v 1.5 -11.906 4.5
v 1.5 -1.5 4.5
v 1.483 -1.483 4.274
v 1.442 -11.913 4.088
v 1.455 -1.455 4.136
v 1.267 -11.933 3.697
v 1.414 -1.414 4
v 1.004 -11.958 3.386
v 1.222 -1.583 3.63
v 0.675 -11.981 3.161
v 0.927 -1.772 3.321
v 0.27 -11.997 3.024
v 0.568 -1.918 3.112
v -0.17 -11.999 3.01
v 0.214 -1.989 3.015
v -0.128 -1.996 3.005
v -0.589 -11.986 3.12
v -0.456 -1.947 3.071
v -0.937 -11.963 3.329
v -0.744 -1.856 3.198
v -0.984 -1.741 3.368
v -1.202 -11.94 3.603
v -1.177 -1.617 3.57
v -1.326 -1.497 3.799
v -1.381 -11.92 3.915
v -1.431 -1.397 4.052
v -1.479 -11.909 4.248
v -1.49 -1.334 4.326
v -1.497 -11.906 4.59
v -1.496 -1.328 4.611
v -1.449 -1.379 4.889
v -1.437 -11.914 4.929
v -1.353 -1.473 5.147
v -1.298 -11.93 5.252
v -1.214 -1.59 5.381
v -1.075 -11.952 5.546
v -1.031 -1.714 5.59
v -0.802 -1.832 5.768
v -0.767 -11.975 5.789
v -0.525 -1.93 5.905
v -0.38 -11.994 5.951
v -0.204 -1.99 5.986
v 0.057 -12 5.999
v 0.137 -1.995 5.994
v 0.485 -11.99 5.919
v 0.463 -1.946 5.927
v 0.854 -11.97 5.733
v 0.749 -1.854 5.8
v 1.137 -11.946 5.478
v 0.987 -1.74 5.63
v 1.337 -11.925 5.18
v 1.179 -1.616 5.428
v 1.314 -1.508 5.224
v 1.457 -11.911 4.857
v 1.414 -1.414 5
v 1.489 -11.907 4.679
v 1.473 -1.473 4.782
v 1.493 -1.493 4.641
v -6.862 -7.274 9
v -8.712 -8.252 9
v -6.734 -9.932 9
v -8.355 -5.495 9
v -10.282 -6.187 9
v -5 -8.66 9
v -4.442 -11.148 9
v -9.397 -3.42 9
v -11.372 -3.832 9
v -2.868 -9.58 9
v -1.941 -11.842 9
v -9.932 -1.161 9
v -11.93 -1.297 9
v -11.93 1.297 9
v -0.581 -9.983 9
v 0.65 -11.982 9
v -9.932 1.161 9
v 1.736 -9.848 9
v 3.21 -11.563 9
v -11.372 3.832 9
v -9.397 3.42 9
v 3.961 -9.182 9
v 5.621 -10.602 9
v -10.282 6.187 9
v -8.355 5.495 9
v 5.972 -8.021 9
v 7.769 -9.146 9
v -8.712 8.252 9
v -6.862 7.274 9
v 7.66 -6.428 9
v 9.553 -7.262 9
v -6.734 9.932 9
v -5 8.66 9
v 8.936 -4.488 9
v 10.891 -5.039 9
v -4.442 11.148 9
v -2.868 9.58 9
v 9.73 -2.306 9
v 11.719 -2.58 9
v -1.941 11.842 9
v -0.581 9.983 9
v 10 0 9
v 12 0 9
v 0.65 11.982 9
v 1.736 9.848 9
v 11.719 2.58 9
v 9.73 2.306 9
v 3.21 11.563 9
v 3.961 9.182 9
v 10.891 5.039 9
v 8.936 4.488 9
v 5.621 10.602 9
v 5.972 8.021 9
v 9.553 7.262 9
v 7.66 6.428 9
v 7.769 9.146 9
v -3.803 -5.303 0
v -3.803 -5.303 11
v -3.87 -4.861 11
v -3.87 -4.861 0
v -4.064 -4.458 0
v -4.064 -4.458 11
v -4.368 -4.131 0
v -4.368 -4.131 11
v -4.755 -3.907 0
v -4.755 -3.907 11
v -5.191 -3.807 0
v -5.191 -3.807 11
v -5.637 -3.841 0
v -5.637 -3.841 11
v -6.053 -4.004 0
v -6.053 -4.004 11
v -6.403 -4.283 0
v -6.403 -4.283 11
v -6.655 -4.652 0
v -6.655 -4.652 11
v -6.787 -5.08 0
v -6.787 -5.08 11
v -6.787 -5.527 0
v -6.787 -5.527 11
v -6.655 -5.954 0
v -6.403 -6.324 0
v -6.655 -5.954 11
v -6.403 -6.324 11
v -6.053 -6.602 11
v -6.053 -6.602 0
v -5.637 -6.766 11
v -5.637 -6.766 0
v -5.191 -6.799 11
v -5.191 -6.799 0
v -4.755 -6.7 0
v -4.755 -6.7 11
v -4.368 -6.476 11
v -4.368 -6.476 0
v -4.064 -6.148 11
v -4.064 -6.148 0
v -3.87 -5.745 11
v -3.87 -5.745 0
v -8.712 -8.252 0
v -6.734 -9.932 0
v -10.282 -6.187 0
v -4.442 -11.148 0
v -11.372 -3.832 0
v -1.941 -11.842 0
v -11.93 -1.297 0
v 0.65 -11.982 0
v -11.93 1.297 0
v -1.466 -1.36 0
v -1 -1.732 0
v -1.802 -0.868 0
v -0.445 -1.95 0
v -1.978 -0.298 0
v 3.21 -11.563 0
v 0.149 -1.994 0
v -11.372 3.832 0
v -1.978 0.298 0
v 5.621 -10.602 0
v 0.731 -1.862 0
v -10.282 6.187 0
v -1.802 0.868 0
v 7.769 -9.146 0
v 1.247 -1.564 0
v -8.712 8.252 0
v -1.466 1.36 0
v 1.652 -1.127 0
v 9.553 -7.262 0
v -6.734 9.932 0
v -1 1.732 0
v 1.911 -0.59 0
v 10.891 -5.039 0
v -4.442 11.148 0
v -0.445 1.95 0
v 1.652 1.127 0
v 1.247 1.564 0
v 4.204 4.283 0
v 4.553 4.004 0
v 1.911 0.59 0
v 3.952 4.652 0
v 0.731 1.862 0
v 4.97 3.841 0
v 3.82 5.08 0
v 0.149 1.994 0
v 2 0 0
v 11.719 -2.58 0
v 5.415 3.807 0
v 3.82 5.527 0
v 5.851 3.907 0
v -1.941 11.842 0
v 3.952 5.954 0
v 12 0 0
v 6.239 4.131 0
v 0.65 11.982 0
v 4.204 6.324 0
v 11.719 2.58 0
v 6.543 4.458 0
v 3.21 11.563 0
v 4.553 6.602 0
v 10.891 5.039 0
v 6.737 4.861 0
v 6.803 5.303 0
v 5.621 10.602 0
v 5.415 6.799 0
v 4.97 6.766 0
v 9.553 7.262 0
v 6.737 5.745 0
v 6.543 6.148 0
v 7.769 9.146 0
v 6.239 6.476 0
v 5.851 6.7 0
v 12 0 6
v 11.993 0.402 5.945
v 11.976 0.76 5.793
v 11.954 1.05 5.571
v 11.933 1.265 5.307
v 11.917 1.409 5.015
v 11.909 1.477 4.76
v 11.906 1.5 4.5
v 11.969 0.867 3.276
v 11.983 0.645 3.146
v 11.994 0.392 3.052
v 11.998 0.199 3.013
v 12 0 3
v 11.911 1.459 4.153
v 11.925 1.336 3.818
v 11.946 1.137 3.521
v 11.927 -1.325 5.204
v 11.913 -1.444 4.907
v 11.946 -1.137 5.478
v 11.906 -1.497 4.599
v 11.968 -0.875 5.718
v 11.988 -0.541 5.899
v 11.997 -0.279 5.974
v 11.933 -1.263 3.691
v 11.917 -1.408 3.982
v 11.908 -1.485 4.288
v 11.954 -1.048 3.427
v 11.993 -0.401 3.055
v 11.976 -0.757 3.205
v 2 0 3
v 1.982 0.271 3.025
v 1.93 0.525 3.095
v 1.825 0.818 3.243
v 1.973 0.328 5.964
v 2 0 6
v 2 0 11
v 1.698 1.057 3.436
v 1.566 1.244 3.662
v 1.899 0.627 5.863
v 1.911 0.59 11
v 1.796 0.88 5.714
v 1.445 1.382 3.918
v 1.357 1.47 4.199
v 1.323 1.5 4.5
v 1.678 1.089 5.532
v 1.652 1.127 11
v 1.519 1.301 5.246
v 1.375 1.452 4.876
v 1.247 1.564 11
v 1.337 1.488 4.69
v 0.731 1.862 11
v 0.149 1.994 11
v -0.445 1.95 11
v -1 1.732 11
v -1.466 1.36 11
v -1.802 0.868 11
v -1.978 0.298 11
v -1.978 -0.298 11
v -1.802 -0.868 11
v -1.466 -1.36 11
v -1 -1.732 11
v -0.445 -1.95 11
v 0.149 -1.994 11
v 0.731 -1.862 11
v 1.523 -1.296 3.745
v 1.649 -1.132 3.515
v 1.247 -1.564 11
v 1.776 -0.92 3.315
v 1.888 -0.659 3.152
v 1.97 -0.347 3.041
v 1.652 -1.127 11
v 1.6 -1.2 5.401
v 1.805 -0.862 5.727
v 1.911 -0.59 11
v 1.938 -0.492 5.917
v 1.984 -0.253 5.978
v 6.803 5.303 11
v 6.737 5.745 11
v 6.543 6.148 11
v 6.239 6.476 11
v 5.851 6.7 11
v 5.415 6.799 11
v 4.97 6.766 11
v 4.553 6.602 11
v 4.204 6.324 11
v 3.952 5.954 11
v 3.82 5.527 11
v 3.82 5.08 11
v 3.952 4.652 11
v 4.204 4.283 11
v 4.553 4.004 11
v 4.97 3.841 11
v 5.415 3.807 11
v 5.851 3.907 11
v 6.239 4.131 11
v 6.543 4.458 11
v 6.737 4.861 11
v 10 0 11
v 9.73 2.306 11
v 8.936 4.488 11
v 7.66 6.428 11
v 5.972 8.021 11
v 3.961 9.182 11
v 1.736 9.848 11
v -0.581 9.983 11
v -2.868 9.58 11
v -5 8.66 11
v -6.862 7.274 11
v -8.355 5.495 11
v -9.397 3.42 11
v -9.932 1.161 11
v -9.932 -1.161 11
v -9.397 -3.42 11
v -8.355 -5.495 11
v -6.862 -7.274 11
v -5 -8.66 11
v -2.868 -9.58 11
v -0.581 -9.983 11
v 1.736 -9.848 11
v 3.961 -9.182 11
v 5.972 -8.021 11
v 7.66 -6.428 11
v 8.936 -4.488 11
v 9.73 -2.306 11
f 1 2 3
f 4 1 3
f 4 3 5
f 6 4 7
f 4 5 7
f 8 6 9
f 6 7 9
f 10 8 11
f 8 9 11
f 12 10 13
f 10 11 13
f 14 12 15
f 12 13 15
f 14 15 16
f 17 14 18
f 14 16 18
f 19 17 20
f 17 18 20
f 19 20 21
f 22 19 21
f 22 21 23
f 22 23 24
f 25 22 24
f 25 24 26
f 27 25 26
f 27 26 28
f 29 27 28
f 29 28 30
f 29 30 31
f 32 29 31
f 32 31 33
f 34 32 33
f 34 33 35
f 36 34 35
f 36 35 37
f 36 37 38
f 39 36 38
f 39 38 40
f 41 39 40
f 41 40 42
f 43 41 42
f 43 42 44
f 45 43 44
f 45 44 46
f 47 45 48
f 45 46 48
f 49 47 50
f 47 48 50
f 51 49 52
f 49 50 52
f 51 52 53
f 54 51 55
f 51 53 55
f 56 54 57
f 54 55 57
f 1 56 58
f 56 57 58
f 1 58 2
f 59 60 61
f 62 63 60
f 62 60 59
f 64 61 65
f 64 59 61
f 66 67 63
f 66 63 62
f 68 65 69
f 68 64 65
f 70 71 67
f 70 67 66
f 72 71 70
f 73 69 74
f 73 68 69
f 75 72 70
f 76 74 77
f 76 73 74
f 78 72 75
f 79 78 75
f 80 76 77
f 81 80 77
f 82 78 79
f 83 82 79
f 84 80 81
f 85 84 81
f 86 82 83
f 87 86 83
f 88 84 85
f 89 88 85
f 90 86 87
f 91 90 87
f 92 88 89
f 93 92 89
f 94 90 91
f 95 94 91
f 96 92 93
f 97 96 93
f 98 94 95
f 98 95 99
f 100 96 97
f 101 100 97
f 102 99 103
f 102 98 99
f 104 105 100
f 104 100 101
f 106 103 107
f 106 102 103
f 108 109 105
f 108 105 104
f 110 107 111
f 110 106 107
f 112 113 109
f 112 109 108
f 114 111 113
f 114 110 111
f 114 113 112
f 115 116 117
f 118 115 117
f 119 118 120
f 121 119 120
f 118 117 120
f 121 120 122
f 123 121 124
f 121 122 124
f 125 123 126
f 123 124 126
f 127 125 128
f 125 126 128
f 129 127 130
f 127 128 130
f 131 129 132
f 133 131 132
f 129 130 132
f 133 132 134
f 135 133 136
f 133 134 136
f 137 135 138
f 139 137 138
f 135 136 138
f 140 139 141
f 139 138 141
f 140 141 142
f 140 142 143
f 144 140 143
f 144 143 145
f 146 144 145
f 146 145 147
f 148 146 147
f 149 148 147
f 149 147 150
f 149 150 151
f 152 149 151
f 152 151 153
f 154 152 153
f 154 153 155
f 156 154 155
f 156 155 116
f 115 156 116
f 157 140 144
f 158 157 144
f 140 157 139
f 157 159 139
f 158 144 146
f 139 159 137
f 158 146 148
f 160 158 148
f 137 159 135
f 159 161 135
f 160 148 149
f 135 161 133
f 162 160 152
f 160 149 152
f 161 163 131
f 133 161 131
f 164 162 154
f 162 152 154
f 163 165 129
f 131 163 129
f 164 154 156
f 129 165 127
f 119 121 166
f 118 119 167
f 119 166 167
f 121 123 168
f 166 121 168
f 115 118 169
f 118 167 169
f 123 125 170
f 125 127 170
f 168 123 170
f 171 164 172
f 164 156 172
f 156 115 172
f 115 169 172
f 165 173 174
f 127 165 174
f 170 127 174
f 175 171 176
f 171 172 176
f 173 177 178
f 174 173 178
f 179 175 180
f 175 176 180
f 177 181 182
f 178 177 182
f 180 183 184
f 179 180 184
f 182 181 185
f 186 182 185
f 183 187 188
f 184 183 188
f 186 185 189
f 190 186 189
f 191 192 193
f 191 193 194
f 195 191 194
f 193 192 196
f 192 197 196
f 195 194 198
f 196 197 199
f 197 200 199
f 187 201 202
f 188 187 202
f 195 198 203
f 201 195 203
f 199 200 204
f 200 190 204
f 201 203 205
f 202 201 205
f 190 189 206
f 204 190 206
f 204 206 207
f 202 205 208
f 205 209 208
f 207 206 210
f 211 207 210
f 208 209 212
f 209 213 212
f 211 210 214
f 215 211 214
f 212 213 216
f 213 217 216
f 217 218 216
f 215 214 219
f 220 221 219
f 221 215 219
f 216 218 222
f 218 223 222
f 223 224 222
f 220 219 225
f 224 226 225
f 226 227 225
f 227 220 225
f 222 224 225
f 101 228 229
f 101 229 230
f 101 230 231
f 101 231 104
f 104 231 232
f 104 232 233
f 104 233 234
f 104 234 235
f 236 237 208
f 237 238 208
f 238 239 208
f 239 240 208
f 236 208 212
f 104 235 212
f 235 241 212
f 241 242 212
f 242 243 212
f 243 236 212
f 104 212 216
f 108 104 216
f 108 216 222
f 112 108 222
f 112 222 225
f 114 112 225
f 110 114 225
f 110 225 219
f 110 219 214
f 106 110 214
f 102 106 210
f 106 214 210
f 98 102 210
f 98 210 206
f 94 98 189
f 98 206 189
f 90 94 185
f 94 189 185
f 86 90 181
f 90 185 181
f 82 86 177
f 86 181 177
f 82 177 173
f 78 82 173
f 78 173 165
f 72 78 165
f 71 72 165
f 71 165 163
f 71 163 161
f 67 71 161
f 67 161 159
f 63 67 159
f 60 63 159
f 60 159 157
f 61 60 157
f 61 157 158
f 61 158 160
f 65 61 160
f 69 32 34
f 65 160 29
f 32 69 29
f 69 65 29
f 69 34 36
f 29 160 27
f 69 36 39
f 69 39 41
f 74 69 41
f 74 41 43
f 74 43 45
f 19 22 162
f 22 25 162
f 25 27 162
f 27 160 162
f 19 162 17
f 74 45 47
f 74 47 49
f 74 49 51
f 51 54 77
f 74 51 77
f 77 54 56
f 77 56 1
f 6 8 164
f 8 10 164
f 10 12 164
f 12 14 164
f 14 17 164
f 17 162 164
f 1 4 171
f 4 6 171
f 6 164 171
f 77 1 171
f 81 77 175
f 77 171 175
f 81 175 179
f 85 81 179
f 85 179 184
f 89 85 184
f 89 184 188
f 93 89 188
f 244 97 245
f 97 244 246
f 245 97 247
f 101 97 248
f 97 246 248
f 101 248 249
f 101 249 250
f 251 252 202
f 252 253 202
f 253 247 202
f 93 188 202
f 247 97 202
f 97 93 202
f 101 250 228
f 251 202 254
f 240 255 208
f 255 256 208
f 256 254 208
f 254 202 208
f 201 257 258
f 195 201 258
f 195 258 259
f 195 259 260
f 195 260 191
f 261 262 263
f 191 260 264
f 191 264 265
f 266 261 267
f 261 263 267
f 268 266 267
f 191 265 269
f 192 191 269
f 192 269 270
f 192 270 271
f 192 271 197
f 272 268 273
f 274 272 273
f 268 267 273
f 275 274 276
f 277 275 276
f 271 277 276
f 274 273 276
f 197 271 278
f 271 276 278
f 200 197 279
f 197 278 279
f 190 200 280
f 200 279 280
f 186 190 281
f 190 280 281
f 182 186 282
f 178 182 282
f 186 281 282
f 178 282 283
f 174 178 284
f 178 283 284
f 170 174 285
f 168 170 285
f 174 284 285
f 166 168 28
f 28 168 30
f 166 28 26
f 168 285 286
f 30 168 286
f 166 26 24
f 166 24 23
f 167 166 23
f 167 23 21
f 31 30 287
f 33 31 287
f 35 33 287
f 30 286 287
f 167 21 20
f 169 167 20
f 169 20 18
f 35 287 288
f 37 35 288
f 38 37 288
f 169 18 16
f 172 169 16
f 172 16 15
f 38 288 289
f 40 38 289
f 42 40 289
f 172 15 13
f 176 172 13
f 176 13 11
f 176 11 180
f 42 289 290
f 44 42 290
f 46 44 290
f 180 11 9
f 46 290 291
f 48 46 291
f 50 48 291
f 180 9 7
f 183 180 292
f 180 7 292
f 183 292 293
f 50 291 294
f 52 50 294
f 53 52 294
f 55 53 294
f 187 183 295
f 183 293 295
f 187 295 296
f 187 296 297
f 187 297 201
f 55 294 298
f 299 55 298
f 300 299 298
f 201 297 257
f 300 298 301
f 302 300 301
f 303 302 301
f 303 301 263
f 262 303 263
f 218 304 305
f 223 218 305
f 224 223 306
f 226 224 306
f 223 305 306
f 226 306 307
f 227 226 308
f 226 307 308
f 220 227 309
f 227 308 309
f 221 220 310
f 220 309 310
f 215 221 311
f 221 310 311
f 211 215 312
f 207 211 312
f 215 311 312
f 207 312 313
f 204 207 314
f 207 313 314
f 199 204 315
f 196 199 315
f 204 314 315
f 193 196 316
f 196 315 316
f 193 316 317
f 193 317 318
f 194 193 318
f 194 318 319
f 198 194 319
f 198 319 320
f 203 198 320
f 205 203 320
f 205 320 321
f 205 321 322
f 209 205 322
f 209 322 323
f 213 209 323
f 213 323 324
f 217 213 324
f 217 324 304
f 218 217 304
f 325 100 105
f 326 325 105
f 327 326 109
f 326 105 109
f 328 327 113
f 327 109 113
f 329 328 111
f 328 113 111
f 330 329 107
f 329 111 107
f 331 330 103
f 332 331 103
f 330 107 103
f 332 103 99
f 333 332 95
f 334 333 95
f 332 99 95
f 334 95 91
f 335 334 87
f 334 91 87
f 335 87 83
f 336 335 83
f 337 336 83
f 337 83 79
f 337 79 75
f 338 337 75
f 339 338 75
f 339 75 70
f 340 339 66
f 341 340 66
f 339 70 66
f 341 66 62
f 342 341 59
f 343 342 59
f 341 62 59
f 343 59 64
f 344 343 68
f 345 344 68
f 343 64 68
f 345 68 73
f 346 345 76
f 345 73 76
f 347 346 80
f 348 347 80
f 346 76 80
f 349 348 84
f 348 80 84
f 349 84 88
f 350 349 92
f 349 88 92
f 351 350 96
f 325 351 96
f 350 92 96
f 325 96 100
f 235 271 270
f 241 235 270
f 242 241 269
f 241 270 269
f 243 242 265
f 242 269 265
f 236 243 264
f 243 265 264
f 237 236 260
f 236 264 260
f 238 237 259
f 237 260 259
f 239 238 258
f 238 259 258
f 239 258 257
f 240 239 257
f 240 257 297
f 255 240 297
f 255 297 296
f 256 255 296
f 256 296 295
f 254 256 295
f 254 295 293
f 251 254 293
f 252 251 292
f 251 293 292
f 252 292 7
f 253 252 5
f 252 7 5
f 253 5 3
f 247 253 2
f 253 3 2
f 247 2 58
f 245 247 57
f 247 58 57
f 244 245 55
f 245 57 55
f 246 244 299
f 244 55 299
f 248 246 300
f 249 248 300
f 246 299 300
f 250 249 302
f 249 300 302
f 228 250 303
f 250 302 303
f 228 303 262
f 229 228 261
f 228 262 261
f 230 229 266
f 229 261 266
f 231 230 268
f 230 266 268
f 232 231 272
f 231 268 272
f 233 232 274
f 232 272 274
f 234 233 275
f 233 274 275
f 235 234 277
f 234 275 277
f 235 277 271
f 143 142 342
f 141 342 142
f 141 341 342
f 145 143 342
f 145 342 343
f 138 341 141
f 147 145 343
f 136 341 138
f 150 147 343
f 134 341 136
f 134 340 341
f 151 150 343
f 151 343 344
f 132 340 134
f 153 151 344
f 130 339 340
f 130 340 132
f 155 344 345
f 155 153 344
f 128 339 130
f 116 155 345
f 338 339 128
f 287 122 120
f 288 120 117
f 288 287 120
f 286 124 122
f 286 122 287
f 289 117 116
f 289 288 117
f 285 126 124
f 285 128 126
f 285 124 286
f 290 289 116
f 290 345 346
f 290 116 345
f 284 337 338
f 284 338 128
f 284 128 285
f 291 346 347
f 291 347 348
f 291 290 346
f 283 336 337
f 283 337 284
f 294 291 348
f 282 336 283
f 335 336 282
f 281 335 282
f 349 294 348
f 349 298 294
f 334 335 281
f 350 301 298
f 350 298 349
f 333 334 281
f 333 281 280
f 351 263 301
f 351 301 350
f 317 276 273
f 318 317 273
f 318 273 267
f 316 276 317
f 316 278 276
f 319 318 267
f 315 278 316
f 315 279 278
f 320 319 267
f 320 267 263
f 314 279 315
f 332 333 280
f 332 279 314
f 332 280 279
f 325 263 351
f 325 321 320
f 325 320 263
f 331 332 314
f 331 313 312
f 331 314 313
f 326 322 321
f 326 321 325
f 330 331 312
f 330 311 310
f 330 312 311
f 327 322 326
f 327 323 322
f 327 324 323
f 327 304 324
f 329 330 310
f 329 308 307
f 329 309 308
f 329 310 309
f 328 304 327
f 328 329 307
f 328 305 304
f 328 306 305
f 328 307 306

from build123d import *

# Parameters (mm, degrees)
ESQUISSE1_R                  = 12
BOSS_EXTRU_1_DEPTH           = 9
ESQUISSE2_R                  = 10
BOSS_EXTRU_2_DEPTH           = 2
ESQUISSE3_R                  = 1.5
ESQUISSE3_R_2                = 2
ENL_V_MAT_EXTRU_1_DEPTH      = 12
ESQUISSE4_R                  = 1.5
ENL_V_MAT_EXTRU_2_DEPTH      = 13
R_P_TITION_CIRCULAIRE1_COUNT = 2
R_P_TITION_CIRCULAIRE1_ANGLE = 90


with BuildPart() as part:
    # Esquisse1 → Boss.-Extru.1 (new body)
    with BuildSketch(Plane.XY):
        Circle(ESQUISSE1_R)
    extrude(amount=BOSS_EXTRU_1_DEPTH)

    # Esquisse2 → Boss.-Extru.2 (add)
    with BuildSketch(Plane.XY.offset(9)):
        Circle(ESQUISSE2_R)
    extrude(amount=BOSS_EXTRU_2_DEPTH)

    # Esquisse3 → Enlèv. mat.-Extru.1 (cut, through all)
    with BuildSketch(Plane.XY.offset(11)):
        with Locations((-5.303300859, -5.303300859)):
            Circle(ESQUISSE3_R)
        with Locations((5.303300859, 5.303300859)):
            Circle(ESQUISSE3_R)
        Circle(ESQUISSE3_R_2)
    extrude(amount=-ENL_V_MAT_EXTRU_1_DEPTH, mode=Mode.SUBTRACT)

    # Esquisse4 → Enlèv. mat.-Extru.2 (cut, through all)
    with BuildSketch(Plane(origin=(0, 0, 0), x_dir=(1, 0, 0), z_dir=(0, 1, 0))):
        with Locations((0, -4.5)):
            Circle(ESQUISSE4_R)
    enl_v_mat_extru_2 = extrude(amount=-ENL_V_MAT_EXTRU_2_DEPTH, mode=Mode.SUBTRACT)

    # Répétition circulaire1: Enlèv. mat.-Extru.2 ×2 about axis
    r_p_tition_circulaire1_axis = Axis((0, 0, 9), (0, 0, 1))
    for i in range(1, R_P_TITION_CIRCULAIRE1_COUNT):
        add(enl_v_mat_extru_2.rotate(r_p_tition_circulaire1_axis, i * R_P_TITION_CIRCULAIRE1_ANGLE / (R_P_TITION_CIRCULAIRE1_COUNT - 1)), mode=Mode.SUBTRACT)


solid = part.part
